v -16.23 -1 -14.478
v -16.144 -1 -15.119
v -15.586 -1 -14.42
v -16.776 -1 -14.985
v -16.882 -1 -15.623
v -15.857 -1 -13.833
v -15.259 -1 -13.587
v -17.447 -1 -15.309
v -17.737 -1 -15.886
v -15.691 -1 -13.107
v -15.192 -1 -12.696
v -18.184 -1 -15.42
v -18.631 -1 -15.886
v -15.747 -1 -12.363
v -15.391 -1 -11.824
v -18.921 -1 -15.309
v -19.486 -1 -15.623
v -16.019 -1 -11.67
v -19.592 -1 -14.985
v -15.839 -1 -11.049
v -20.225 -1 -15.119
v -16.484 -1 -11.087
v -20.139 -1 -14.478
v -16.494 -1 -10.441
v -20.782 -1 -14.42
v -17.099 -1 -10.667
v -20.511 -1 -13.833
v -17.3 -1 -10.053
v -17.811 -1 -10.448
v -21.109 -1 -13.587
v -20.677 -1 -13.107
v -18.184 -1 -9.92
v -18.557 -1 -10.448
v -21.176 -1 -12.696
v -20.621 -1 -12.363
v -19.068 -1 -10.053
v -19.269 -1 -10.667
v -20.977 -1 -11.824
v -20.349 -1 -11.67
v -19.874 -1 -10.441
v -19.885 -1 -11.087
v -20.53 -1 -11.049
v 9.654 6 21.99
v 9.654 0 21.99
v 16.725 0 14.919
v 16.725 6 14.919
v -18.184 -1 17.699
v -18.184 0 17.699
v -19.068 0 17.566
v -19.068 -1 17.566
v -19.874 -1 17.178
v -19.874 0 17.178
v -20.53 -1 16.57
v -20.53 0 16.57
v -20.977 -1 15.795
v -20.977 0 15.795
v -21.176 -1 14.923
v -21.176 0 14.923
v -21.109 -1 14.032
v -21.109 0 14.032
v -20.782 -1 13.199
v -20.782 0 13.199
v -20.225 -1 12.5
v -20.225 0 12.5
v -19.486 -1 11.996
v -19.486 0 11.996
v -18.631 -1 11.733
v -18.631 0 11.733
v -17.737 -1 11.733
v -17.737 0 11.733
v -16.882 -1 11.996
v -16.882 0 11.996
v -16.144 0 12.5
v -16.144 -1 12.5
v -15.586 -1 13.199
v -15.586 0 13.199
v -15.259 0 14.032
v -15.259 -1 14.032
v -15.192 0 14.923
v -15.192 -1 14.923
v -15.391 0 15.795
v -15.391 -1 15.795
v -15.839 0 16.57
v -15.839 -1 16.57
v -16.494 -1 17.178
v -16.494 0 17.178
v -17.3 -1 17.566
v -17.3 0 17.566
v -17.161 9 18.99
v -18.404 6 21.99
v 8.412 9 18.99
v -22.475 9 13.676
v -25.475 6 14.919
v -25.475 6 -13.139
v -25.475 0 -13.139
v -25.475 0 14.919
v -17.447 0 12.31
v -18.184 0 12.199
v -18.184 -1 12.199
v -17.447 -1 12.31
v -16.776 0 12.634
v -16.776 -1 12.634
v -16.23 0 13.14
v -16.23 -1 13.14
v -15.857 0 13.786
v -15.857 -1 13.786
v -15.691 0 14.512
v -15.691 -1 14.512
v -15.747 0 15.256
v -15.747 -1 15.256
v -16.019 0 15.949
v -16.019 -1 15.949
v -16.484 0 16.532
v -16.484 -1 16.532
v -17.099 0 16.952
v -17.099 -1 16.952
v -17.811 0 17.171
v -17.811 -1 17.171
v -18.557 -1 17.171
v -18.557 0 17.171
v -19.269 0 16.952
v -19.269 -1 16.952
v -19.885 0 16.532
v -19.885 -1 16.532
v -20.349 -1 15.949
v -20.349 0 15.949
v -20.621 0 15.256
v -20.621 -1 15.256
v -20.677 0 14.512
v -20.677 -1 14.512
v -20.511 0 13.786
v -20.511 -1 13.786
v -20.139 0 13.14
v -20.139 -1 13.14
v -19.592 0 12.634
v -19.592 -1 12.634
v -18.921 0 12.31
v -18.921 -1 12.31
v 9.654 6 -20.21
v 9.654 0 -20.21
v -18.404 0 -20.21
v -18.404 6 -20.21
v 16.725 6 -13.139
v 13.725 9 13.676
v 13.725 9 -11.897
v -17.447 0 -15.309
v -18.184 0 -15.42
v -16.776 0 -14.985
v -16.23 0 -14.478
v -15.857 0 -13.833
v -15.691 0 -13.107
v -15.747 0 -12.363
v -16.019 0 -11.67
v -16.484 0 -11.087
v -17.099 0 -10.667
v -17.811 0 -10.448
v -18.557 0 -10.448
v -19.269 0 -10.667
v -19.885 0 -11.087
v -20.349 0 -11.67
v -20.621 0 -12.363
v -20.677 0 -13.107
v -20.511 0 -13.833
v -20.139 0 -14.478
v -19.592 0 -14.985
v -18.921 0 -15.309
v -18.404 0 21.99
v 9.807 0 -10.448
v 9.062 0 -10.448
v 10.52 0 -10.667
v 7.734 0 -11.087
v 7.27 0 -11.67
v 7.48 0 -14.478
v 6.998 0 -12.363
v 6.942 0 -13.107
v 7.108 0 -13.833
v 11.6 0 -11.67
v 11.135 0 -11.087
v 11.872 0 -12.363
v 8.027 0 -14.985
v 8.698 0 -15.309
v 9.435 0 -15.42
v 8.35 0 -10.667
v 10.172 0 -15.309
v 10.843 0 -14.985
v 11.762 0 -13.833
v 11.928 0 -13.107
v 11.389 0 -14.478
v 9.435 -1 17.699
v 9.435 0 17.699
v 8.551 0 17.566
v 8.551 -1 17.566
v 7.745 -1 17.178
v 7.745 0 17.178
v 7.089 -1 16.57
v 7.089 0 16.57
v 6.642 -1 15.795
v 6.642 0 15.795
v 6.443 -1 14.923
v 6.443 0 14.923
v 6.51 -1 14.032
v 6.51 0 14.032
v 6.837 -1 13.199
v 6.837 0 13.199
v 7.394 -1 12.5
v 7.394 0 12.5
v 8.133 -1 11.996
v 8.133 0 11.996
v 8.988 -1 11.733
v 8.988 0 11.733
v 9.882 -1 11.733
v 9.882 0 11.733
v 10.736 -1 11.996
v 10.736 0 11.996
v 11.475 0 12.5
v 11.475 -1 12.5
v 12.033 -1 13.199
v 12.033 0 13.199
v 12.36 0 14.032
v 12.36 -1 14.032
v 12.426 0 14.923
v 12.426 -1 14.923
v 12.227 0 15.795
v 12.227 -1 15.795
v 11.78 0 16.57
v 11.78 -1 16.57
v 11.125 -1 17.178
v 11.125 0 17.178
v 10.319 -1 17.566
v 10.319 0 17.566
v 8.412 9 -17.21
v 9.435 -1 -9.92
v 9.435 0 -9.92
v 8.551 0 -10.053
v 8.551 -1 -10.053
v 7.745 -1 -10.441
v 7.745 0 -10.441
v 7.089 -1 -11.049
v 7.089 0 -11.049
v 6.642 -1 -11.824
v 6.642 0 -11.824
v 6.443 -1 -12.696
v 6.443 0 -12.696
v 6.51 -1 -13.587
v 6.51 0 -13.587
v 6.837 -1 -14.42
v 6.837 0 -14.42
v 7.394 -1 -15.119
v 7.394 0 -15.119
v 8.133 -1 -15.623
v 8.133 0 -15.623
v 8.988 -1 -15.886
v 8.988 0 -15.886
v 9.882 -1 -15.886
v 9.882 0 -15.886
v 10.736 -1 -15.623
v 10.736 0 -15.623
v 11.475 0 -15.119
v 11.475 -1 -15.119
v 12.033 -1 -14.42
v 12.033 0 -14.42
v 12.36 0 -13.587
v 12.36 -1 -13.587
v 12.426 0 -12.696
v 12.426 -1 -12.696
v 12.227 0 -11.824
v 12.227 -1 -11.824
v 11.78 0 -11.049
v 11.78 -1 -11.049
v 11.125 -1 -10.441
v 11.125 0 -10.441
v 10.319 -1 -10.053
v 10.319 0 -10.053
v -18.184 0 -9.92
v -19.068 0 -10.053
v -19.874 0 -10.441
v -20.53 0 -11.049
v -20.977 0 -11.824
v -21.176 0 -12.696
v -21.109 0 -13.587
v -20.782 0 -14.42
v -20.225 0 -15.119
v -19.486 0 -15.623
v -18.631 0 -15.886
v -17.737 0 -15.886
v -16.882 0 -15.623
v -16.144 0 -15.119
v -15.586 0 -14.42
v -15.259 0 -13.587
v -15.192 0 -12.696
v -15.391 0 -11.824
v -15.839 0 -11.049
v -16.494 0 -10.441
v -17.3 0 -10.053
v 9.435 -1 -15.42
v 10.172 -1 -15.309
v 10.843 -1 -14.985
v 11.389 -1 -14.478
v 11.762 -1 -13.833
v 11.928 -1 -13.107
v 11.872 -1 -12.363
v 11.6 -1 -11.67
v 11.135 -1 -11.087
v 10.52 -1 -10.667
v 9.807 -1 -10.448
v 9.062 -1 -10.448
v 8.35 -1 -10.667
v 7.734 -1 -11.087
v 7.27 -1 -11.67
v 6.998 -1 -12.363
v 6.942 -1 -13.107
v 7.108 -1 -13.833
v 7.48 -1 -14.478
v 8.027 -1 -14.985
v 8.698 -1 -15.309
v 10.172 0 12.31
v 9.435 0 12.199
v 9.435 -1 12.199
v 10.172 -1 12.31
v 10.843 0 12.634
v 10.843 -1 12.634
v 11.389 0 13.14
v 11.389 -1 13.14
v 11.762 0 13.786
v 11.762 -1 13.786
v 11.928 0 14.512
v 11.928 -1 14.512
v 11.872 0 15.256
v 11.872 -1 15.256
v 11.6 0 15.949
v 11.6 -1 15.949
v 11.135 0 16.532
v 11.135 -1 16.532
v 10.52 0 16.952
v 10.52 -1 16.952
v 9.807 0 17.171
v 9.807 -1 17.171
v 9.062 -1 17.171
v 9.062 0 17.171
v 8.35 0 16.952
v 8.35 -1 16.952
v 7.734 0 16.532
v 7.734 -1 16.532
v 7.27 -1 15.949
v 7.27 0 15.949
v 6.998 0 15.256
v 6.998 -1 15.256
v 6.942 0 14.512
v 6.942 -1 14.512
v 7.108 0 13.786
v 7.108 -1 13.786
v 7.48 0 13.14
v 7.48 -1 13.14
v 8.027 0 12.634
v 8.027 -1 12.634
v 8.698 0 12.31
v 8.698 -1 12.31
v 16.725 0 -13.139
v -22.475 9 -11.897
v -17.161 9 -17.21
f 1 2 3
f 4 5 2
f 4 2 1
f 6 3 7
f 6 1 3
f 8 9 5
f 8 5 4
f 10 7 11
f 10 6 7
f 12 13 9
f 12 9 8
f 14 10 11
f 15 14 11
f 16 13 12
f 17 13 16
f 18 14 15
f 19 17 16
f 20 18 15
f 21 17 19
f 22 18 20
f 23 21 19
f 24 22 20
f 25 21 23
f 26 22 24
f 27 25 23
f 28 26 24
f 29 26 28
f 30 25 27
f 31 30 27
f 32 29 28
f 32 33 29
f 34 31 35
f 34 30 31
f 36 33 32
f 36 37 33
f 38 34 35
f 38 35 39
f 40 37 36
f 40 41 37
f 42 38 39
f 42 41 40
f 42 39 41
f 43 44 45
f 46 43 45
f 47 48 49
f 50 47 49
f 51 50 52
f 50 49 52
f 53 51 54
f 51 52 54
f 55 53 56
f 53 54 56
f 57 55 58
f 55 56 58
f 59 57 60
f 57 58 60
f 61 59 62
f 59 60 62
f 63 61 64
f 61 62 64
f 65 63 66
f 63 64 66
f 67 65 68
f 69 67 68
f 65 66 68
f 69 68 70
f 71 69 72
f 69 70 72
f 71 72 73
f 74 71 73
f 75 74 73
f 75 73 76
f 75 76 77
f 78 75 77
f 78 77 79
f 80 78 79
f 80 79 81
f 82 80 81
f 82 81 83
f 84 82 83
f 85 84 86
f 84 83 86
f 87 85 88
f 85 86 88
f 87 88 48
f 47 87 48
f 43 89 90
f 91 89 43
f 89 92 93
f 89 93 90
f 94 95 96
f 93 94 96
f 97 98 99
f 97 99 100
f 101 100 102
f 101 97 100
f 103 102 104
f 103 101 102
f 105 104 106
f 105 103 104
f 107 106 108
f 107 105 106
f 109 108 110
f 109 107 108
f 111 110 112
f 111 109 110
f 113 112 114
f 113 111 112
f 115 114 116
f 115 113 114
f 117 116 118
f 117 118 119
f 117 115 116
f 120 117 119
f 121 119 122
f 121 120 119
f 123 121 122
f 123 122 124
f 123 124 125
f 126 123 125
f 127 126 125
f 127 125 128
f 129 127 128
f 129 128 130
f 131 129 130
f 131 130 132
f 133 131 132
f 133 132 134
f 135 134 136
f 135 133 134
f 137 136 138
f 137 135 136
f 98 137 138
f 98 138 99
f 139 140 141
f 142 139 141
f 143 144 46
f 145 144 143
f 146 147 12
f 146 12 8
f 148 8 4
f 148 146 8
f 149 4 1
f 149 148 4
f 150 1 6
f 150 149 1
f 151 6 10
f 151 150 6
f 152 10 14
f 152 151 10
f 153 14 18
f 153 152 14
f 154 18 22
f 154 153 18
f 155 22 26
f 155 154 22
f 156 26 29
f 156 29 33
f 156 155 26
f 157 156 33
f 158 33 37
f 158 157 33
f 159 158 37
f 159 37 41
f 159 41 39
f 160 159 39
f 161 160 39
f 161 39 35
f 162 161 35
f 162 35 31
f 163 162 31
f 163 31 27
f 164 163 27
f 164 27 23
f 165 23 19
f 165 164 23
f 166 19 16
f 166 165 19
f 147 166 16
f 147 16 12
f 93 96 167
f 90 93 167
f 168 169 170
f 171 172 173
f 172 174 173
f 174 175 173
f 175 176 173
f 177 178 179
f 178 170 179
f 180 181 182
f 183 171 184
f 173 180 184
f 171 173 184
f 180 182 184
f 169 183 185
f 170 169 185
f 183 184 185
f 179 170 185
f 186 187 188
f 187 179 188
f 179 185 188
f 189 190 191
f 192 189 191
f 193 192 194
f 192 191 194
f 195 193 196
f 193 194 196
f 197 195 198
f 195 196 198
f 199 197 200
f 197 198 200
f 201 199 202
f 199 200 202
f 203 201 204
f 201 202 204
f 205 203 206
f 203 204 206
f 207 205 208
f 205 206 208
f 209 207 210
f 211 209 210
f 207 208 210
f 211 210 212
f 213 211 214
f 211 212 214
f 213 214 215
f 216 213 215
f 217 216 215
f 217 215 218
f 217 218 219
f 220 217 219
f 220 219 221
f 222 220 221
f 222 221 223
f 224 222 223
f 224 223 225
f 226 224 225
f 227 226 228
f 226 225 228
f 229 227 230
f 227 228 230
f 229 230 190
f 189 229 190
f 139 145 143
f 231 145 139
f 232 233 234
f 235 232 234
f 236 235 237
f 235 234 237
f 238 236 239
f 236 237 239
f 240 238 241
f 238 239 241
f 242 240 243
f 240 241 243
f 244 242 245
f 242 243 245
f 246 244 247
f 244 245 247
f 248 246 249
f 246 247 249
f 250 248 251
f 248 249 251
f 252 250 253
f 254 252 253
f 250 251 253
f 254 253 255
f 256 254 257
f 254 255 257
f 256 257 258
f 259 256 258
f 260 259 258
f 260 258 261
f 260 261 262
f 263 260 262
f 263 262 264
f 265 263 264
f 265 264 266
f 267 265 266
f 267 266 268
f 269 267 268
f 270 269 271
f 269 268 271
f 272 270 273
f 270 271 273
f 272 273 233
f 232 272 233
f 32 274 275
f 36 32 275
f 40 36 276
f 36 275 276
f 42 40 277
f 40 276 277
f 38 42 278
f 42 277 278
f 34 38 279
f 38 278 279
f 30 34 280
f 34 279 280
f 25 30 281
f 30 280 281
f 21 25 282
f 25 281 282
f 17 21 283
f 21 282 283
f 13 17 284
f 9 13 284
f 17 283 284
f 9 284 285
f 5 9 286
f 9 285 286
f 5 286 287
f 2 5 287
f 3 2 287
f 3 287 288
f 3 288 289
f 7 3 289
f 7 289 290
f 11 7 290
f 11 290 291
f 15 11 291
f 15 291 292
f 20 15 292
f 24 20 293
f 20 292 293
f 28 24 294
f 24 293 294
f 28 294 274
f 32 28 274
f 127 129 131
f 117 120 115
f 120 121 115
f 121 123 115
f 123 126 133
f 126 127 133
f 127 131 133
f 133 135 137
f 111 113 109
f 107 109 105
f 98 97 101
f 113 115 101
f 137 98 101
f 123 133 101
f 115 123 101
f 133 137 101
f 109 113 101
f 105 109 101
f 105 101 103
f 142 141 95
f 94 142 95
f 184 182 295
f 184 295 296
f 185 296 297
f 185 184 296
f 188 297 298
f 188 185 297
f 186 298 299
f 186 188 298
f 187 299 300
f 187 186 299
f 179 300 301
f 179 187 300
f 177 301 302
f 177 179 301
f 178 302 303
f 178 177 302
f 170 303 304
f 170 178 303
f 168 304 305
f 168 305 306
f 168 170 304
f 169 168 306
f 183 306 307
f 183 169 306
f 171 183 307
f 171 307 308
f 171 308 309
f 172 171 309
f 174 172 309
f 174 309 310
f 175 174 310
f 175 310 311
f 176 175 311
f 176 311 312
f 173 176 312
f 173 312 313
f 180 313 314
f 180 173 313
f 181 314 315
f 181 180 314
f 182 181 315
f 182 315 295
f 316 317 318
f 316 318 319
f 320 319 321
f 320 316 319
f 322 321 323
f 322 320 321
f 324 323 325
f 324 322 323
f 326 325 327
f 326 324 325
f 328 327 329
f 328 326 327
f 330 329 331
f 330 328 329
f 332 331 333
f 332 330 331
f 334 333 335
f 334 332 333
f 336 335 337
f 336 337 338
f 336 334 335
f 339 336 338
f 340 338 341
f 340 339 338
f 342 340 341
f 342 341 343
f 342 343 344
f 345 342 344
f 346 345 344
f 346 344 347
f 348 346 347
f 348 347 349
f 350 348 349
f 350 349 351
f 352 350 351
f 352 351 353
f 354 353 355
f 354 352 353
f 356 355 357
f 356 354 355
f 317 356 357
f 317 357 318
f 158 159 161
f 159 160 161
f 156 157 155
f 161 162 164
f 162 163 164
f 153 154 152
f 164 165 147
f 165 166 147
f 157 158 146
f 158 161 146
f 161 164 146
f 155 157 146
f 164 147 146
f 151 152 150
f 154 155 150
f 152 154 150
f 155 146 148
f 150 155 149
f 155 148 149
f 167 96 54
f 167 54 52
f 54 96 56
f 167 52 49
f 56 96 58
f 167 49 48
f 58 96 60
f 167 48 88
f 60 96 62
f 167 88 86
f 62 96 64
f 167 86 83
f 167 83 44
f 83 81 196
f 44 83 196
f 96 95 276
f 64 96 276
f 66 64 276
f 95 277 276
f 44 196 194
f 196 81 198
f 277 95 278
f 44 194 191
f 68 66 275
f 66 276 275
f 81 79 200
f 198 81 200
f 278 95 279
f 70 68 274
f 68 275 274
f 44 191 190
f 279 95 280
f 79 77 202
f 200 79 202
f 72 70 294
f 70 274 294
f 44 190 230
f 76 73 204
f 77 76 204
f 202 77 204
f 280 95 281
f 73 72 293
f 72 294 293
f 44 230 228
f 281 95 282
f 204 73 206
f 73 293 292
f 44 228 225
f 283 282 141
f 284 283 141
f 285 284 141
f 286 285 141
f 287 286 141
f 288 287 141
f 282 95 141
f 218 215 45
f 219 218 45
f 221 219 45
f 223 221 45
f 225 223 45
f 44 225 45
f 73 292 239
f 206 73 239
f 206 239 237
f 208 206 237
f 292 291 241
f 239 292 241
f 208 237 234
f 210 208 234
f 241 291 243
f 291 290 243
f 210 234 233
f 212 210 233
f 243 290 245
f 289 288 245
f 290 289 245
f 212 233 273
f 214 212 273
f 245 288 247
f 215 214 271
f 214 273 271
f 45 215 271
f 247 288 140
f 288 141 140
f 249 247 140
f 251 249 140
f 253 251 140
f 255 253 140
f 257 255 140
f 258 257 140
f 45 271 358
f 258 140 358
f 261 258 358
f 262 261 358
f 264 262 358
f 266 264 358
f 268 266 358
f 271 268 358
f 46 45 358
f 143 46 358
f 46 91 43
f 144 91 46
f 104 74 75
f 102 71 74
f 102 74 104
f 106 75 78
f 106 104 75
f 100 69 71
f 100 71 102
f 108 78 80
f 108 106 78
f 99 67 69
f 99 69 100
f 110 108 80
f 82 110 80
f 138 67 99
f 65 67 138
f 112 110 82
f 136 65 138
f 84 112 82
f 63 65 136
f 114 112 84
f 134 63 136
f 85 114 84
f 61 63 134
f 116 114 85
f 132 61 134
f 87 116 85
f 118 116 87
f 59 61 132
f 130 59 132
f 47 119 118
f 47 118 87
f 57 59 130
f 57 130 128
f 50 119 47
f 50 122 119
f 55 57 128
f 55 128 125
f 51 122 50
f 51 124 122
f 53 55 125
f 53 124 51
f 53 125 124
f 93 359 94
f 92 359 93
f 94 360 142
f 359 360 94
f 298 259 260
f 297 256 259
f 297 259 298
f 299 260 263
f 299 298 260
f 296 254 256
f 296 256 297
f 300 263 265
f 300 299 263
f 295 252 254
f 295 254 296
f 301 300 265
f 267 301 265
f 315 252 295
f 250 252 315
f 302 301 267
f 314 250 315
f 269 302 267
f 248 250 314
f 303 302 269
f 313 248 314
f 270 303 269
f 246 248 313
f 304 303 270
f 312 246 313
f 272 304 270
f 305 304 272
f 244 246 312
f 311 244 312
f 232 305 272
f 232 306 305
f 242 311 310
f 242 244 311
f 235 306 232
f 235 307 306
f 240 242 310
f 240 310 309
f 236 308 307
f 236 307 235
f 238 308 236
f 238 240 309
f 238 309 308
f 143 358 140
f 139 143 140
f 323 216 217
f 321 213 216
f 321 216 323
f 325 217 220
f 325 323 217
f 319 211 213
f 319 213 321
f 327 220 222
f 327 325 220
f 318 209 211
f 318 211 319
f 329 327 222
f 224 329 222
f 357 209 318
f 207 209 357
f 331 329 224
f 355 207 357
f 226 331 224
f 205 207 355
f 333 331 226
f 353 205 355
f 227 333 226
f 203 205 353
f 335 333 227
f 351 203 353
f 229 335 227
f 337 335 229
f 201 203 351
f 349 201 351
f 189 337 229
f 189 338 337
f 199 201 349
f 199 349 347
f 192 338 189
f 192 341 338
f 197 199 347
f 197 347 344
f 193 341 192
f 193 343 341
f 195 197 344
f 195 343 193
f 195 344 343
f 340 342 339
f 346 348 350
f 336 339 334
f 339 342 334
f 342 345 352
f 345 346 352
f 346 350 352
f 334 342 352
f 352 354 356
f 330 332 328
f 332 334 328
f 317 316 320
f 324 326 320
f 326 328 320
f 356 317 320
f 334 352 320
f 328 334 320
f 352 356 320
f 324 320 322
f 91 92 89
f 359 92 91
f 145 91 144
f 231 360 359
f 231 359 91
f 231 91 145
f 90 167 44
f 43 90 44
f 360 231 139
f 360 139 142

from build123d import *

# Parameters (mm, degrees)
EXTRUDE_1_DEPTH = 9
CHAMFER_1_SIZE  = 3
SKETCH_3_R      = 3
SKETCH_3_R_2    = 2.5
EXTRUDE_2_DEPTH = 1


with BuildPart() as part:
    # 草图1 → 凸台-拉伸1 (new body)
    with BuildSketch(Plane(origin=(0, 0, 0), x_dir=(1, 0, 0), z_dir=(0, 1, 0))):
        Polygon((-18.403562193, 20.210244745), (-25.474630004, 13.139176933), (-25.474630004, -14.918687443), (-18.403562193, -21.989755255), (9.654302184, -21.989755255), (16.725369996, -14.918687443), (16.725369996, 13.139176933), (9.654302184, 20.210244745), align=None)
    extrude(amount=EXTRUDE_1_DEPTH)

    # 倒角1
    chamfer_1_edges = [part.edges().sort_by_distance(p)[0] for p in [
        (-25.474630004, 9, 0.889755255),
        (-21.939096098, 9, 18.454221349),
        (-4.374630004, 9, 21.989755255),
        (13.18983609, 9, 18.454221349),
        (16.725369996, 9, 0.889755255),
        (13.18983609, 9, -16.674710839),
        (-4.374630004, 9, -20.210244745),
        (-21.939096098, 9, -16.674710839),
    ]]
    chamfer(chamfer_1_edges, length=CHAMFER_1_SIZE)

    # 草图3 → 凸台-拉伸2 (add)
    # profile 1 of 4: a face of its own
    with BuildSketch(Plane.XZ):
        with Locations(Location((9.434831814, 14.699217073, 0), (0, 0, 90))):
            Circle(SKETCH_3_R)
        with Locations(Location((9.434831814, 14.699217073, 0), (0, 0, 270))):
            Circle(SKETCH_3_R_2, mode=Mode.SUBTRACT)
    # profile 2 of 4: a face of its own
    with BuildSketch(Plane.XZ):
        with Locations(Location((9.434831814, -12.919706563, 0), (0, 0, 90))):
            Circle(SKETCH_3_R)
        with Locations(Location((9.434831814, -12.919706563, 0), (0, 0, 270))):
            Circle(SKETCH_3_R_2, mode=Mode.SUBTRACT)
    # profile 3 of 4: a face of its own
    with BuildSketch(Plane.XZ):
        with Locations(Location((-18.184091822, -12.919706563, 0), (0, 0, 90))):
            Circle(SKETCH_3_R)
        with Locations(Location((-18.184091822, -12.919706563, 0), (0, 0, 270))):
            Circle(SKETCH_3_R_2, mode=Mode.SUBTRACT)
    # profile 4 of 4: a face of its own
    with BuildSketch(Plane.XZ):
        with Locations(Location((-18.184091822, 14.699217073, 0), (0, 0, 90))):
            Circle(SKETCH_3_R)
        with Locations(Location((-18.184091822, 14.699217073, 0), (0, 0, 270))):
            Circle(SKETCH_3_R_2, mode=Mode.SUBTRACT)
    extrude(amount=EXTRUDE_2_DEPTH)


solid = part.part
